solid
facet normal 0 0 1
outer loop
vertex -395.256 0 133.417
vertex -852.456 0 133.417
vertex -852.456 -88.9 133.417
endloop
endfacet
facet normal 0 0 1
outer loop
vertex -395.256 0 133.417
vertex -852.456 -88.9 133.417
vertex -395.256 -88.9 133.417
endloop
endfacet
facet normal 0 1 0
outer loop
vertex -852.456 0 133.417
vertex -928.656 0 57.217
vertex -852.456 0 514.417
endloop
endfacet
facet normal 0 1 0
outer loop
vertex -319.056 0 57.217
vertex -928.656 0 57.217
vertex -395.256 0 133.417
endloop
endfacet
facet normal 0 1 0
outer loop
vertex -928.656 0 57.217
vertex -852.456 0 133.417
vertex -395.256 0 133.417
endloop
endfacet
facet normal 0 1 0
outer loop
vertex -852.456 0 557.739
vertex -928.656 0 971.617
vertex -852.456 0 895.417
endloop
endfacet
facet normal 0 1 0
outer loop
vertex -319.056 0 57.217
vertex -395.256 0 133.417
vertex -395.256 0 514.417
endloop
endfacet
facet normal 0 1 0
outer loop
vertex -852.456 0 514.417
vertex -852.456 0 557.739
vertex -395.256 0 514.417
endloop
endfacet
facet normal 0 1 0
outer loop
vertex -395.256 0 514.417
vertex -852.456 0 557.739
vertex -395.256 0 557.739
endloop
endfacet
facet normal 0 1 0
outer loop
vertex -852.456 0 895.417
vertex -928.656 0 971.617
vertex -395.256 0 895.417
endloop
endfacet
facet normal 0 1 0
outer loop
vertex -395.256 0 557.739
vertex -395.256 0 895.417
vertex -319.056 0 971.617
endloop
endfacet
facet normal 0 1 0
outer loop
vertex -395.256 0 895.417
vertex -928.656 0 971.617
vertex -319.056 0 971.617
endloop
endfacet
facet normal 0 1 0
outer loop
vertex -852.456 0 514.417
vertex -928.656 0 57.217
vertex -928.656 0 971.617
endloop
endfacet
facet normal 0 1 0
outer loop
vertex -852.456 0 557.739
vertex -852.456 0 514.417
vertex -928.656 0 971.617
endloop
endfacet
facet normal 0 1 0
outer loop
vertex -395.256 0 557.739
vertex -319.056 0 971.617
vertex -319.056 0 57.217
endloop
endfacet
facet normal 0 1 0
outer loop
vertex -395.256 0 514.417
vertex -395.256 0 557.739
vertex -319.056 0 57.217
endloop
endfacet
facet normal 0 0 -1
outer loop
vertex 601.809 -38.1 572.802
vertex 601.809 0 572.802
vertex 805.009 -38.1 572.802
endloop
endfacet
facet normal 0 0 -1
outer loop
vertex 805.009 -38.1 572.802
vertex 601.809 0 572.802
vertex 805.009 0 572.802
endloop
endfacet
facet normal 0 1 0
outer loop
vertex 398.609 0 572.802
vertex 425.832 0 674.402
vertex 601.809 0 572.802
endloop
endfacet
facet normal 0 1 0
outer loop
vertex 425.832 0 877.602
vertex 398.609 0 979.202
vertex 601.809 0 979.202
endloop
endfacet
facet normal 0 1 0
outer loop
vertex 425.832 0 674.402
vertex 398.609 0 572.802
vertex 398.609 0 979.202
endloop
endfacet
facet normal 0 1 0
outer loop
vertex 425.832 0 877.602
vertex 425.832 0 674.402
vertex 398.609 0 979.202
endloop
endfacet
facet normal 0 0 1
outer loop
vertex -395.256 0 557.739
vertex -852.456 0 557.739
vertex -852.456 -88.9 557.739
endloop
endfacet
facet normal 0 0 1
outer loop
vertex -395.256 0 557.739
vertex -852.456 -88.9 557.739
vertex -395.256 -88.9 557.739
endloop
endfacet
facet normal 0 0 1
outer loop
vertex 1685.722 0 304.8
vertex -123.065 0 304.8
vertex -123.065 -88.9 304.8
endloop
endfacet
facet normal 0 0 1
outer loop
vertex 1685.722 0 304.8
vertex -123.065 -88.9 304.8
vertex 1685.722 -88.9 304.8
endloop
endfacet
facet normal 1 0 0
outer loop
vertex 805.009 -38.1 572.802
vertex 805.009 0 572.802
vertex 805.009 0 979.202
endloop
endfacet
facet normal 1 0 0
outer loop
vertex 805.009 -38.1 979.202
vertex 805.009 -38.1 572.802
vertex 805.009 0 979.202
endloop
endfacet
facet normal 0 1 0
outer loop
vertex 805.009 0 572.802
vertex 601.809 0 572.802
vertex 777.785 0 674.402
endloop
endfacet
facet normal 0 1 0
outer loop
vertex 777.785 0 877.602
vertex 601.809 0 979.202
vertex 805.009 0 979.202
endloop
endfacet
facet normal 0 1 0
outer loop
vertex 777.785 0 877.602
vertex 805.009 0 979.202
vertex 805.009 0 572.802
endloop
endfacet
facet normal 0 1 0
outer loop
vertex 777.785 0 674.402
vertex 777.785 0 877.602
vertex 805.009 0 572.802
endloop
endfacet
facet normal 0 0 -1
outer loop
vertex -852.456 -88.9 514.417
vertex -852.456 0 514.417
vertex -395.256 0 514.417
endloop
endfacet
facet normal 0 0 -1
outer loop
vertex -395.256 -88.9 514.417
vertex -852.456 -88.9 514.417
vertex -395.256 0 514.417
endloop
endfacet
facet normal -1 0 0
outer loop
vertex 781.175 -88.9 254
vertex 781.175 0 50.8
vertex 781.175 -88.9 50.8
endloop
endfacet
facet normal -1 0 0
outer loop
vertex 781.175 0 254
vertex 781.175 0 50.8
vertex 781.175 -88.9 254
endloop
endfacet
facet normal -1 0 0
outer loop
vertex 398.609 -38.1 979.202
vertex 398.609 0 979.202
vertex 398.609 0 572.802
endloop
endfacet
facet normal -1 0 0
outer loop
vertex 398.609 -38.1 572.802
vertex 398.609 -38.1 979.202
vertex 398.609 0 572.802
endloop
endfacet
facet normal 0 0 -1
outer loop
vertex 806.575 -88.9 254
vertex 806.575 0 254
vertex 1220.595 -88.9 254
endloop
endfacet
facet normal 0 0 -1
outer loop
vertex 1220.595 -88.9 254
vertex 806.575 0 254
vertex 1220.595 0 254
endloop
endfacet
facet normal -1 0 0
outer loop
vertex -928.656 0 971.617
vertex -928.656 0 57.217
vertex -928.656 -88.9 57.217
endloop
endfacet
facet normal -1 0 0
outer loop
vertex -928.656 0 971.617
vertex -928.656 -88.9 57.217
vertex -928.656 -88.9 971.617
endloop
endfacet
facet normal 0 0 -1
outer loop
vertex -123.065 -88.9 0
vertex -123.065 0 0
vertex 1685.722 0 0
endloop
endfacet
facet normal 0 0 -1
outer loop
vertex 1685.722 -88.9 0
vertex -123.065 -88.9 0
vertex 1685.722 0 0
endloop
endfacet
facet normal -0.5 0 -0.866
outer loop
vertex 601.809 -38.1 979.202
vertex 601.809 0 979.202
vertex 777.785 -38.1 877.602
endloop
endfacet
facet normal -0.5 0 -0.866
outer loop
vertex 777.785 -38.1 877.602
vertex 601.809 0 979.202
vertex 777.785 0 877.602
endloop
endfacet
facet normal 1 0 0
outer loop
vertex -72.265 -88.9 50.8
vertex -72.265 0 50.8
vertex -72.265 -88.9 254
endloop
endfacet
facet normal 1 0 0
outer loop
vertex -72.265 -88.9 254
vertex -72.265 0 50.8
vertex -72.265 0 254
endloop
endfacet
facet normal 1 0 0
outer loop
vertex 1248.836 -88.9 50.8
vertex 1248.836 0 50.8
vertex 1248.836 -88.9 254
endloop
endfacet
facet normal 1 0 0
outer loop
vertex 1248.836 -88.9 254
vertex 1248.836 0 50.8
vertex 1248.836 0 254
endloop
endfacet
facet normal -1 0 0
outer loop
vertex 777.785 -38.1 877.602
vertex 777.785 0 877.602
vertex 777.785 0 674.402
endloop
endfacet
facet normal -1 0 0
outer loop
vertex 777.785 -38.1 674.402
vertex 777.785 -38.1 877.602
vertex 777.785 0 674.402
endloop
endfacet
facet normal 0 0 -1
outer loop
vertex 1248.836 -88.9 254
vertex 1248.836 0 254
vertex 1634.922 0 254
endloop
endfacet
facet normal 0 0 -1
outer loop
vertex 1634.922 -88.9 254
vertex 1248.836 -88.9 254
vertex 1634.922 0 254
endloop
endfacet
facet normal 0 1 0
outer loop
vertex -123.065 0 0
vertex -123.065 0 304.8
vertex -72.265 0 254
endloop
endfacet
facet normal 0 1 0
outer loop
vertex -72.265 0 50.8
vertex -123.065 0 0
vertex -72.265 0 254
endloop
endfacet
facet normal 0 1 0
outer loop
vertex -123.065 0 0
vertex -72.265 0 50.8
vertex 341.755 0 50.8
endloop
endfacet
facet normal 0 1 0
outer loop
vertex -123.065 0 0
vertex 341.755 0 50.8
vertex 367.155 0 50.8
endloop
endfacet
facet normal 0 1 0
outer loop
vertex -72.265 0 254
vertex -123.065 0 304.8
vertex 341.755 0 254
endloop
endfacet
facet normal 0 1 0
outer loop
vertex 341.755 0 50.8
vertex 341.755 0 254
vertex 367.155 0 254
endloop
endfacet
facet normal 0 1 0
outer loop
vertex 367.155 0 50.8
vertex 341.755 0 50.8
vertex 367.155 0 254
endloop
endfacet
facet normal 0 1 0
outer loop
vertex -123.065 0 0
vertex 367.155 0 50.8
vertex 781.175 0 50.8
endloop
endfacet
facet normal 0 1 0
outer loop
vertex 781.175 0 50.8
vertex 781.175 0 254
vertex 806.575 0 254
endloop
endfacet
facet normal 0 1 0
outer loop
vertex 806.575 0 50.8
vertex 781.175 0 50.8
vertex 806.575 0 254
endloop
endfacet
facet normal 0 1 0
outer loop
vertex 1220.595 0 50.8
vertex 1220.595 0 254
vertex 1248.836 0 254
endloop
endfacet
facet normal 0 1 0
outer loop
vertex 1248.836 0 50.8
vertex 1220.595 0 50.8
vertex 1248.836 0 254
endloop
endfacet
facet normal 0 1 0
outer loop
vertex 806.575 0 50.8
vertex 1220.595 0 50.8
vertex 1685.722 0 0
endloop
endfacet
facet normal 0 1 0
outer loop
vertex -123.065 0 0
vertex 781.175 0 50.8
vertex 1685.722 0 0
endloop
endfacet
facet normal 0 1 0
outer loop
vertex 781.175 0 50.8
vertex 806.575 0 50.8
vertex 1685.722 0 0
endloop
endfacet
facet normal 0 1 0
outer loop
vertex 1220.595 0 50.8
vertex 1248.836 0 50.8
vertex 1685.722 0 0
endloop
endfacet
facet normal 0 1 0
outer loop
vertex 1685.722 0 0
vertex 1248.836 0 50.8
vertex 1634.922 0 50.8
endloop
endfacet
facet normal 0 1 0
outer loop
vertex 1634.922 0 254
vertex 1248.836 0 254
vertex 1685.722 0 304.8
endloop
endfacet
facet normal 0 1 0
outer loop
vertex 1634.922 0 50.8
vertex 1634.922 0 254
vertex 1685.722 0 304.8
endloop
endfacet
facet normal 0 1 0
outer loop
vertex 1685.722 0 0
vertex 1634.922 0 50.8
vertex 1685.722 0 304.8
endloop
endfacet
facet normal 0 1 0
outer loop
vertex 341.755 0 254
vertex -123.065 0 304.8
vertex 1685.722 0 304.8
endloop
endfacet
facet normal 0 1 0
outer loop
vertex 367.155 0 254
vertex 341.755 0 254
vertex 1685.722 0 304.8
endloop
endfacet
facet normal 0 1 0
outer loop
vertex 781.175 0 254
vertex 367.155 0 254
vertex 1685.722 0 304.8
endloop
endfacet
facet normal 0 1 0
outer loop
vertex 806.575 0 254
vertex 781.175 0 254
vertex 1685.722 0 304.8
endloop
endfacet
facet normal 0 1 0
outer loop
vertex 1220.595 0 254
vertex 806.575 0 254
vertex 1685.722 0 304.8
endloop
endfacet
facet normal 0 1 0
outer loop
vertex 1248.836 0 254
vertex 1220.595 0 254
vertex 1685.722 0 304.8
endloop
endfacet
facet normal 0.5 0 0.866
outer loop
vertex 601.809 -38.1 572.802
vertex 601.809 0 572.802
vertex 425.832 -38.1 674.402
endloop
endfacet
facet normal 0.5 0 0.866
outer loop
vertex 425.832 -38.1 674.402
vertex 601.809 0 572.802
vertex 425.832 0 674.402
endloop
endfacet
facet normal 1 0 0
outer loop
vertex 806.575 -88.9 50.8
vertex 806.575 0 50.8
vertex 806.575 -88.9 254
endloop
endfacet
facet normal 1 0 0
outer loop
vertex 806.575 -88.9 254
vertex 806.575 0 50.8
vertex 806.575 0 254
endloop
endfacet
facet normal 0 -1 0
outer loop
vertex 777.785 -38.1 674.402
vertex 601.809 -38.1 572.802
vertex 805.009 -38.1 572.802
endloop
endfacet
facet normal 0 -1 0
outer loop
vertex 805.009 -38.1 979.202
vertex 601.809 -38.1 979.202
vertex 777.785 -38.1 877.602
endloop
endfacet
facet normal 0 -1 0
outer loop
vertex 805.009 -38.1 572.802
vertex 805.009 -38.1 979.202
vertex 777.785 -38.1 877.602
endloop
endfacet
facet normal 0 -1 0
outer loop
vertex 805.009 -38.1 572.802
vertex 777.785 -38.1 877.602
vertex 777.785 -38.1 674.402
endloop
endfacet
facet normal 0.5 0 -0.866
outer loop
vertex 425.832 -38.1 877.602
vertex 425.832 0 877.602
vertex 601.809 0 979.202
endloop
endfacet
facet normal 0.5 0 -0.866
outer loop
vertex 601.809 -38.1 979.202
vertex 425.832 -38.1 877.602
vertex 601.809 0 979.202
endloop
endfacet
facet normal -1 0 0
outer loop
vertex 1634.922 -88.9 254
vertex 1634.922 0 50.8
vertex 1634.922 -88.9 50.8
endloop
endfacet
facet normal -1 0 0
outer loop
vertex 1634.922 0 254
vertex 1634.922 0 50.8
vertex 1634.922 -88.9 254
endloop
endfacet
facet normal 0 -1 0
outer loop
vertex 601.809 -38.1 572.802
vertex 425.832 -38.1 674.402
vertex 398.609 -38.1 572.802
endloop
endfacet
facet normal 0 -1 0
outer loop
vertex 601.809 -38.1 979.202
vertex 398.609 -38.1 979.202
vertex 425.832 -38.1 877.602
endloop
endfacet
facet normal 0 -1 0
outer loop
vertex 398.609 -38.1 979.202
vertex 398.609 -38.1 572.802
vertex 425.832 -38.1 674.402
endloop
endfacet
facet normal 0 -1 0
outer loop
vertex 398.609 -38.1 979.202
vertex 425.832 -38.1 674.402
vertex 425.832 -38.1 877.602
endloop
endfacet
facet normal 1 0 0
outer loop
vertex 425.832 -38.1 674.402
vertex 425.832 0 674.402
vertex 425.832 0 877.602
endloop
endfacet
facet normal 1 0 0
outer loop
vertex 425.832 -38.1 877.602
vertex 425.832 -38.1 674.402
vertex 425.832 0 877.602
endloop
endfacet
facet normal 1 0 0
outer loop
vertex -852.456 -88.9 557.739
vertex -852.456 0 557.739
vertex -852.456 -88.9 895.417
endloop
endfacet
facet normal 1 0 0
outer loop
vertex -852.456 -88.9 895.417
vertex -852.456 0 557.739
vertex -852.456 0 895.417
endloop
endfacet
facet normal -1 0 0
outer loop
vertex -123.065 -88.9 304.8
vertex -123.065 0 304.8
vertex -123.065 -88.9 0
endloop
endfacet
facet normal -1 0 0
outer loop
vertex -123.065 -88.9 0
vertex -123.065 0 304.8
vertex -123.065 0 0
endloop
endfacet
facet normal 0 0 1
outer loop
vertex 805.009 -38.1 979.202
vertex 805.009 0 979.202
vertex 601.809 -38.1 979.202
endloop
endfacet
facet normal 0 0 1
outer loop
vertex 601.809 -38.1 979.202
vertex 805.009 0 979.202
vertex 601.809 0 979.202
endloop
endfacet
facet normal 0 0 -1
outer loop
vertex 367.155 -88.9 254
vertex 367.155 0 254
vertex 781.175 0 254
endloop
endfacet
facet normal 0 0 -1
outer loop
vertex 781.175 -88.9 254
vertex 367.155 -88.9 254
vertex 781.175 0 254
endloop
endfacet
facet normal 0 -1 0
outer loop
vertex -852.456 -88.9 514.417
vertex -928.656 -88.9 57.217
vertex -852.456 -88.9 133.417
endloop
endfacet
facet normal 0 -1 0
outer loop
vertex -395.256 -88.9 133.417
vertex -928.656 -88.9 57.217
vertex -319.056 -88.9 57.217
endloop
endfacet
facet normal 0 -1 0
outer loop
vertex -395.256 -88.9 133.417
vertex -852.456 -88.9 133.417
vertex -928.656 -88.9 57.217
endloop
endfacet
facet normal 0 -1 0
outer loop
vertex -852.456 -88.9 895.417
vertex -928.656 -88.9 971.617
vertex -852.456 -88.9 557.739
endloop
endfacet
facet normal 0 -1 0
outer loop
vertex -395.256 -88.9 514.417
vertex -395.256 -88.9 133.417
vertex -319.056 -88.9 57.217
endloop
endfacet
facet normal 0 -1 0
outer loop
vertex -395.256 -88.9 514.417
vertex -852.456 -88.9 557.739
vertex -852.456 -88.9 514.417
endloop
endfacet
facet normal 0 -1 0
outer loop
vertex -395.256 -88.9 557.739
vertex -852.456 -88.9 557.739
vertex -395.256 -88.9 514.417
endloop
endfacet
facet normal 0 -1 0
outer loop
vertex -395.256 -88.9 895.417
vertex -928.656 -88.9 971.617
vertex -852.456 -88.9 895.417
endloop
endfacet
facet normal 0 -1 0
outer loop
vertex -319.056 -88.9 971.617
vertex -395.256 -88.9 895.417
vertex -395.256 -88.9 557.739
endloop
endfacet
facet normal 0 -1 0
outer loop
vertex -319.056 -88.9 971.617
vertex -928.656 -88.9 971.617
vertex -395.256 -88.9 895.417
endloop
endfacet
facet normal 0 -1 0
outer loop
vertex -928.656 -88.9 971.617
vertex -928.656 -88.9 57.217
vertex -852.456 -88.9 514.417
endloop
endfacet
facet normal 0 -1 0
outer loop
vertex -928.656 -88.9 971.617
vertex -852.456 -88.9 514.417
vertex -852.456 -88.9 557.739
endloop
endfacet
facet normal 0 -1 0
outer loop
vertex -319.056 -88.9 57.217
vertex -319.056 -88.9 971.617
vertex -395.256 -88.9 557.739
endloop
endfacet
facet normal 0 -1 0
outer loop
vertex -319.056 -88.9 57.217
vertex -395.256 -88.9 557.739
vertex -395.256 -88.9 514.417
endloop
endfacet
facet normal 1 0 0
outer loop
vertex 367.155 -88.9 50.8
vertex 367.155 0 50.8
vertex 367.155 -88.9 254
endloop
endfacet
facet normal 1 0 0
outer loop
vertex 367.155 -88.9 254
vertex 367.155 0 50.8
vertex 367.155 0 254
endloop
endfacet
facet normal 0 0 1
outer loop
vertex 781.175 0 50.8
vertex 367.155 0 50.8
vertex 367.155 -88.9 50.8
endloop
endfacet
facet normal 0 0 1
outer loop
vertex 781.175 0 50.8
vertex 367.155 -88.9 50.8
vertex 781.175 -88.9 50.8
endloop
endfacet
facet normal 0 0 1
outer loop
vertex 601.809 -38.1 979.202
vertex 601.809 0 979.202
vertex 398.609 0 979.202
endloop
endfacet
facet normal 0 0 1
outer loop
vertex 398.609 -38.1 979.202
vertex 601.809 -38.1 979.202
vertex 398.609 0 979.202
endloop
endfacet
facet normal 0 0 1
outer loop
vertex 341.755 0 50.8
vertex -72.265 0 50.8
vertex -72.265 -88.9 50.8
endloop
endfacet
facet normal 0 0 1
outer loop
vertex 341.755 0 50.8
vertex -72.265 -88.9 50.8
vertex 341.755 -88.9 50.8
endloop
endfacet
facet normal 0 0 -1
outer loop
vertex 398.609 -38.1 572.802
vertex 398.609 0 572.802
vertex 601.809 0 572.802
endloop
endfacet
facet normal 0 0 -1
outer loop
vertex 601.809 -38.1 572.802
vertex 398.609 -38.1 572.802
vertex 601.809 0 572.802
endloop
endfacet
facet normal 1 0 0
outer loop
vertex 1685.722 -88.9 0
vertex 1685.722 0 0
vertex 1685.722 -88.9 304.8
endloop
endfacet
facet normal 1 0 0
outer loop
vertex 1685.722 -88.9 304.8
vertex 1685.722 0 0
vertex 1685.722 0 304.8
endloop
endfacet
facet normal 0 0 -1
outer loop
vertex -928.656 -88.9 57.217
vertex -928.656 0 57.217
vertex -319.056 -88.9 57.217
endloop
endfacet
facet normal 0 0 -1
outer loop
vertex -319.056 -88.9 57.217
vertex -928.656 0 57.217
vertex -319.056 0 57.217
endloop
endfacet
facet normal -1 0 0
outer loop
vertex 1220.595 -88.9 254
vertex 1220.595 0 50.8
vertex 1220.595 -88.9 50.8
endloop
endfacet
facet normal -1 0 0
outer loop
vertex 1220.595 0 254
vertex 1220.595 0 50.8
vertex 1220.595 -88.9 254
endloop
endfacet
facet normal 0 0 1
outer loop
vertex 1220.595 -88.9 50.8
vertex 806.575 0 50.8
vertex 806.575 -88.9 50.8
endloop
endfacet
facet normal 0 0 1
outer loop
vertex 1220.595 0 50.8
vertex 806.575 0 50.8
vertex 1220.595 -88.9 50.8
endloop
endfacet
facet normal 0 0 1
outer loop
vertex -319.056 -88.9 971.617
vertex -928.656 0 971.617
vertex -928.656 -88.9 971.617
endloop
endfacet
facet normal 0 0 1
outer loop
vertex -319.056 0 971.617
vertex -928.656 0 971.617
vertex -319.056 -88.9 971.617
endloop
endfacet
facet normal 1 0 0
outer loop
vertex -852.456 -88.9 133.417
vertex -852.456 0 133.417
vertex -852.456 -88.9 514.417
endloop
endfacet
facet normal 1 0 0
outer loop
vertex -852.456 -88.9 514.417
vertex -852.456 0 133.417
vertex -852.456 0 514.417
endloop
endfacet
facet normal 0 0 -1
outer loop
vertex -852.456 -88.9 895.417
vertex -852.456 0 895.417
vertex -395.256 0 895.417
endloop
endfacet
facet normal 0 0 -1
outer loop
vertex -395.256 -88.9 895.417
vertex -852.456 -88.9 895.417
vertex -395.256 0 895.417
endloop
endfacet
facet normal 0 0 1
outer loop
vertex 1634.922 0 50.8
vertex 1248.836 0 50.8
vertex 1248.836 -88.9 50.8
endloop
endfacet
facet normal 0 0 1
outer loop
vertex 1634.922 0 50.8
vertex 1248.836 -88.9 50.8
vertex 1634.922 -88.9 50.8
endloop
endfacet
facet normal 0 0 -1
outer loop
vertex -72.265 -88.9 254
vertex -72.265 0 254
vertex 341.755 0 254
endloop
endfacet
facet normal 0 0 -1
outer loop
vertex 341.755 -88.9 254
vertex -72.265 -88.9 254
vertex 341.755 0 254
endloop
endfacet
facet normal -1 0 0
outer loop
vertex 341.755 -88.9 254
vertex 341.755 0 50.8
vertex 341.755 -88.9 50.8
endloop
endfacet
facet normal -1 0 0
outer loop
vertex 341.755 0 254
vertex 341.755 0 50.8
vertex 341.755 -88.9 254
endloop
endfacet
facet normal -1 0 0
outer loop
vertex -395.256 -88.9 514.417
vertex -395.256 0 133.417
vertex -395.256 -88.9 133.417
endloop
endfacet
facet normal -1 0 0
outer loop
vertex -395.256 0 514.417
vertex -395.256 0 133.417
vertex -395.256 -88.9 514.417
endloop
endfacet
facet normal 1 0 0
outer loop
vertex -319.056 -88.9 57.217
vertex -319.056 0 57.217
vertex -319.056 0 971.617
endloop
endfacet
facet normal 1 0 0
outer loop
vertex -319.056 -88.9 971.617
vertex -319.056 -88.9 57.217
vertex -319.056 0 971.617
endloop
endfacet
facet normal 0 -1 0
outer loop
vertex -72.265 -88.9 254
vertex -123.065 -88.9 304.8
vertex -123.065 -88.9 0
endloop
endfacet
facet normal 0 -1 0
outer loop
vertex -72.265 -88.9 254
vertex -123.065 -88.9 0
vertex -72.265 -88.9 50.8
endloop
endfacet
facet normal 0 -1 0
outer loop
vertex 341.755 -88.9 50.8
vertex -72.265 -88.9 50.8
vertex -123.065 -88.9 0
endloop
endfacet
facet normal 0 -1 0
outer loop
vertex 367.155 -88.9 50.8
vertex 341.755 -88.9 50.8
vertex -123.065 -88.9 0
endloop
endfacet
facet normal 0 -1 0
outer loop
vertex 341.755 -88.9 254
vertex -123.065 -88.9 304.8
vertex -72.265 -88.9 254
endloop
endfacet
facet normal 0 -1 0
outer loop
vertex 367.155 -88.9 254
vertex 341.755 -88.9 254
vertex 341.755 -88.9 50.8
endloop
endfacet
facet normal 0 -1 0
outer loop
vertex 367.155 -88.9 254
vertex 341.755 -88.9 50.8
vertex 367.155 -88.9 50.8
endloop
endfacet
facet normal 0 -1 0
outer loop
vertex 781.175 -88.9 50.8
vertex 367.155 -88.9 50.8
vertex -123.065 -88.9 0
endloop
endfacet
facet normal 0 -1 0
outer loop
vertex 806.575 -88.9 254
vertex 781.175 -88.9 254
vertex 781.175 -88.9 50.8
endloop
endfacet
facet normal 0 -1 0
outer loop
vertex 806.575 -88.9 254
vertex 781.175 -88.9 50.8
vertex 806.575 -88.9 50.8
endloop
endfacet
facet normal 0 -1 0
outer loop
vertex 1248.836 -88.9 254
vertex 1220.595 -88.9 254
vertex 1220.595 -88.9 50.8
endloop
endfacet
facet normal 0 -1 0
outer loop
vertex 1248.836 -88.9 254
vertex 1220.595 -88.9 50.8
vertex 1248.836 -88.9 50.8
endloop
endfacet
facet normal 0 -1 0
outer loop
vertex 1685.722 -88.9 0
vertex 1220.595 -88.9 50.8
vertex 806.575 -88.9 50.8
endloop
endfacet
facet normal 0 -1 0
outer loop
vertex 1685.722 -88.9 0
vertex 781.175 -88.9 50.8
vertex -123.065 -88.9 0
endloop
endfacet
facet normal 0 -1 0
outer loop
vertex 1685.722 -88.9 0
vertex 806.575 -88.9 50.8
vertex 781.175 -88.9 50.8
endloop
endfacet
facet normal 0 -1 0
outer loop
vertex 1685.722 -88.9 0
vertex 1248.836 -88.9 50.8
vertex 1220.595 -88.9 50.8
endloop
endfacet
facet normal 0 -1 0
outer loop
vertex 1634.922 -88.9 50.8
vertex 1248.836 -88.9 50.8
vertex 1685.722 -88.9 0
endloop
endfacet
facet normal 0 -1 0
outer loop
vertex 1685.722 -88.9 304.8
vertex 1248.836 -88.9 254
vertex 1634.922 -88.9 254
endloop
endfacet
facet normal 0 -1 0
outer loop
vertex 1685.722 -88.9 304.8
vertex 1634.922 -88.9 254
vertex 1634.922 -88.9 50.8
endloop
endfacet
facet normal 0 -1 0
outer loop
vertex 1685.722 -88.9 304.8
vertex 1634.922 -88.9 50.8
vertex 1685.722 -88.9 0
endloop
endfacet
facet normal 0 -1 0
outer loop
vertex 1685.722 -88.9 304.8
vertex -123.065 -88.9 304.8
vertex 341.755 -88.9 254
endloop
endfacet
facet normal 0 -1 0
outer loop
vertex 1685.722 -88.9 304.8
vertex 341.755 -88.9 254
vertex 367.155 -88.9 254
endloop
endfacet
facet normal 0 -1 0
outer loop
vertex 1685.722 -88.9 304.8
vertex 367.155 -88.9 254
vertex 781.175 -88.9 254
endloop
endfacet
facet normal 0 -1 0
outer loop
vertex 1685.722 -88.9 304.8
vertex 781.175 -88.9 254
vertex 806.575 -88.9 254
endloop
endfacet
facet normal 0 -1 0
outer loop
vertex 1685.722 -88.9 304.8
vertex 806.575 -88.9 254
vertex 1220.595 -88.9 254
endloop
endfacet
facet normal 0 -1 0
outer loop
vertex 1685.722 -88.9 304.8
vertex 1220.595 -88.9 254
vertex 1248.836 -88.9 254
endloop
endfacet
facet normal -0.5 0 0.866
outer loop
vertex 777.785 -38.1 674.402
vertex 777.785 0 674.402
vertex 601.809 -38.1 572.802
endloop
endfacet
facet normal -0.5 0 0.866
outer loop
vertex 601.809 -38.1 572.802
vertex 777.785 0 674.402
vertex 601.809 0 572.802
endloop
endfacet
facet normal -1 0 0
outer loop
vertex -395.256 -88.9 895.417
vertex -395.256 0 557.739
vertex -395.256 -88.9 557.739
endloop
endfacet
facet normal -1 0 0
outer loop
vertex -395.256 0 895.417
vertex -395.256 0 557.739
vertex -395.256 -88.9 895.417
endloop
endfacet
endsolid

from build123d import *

# Parameters (mm, degrees)
F0_W     = 1808.7867725551
F0_H     = 0.358789257
F0_H_2   = 304.441210743
F0_W_2   = 414.02
F0_H_3   = 203.2
F0_W_3   = 386.0863779962
F1_DEPTH = 88.9
F2_W     = 609.6
F2_H     = 914.4
F2_W_2   = 457.2
F2_H_2   = 381
F2_H_3   = 337.6778893888
F3_DEPTH = 88.9
F5_DEPTH = 38.1


with BuildPart() as f1:
    # F0 (on Front) → F1 (new body)
    with BuildSketch(Plane.XZ):
        with Locations((781.3286745876, 0.1793946285)):
            Rectangle(F0_W, F0_H)
        with Locations((781.3286745876, 152.5793946285)):
            Rectangle(F0_W, F0_H_2)
        with Locations((134.7452883101, 152.4)):
            Rectangle(F0_W_2, F0_H_3, mode=Mode.SUBTRACT)
        with Locations((574.1652883101, 152.4)):
            Rectangle(F0_W_2, F0_H_3, mode=Mode.SUBTRACT)
        with Locations((1013.5852883101, 152.4)):
            Rectangle(F0_W_2, F0_H_3, mode=Mode.SUBTRACT)
        with Locations((1441.8788718671, 152.4)):
            Rectangle(F0_W_3, F0_H_3, mode=Mode.SUBTRACT)
    extrude(amount=F1_DEPTH)


with BuildPart() as f3:
    # F2 (on Front) → F3 (new body)
    with BuildSketch(Plane.XZ):
        with Locations((-623.8560936928, 514.4173856199)):
            Rectangle(F2_W, F2_H)
        with Locations((-623.8560936928, 323.9173856199)):
            Rectangle(F2_W_2, F2_H_2, mode=Mode.SUBTRACT)
        with Locations((-623.8560936928, 726.5784409255)):
            Rectangle(F2_W_2, F2_H_3, mode=Mode.SUBTRACT)
    extrude(amount=F3_DEPTH)


with BuildPart() as f5:
    # F4 (on Front) → F5 (new body)
    with BuildSketch(Plane.XZ):
        Polygon((805.008807373, 979.201887989), (601.808807373, 979.201887989), (777.785169422, 877.601887989), (777.785169422, 674.401887989), (601.808807373, 572.801887989), (805.008807373, 572.801887989), align=None)
    extrude(amount=F5_DEPTH)


with BuildPart() as f5b:
    # F4 (on Front) → F5, piece 2 (new body)
    with BuildSketch(Plane.XZ):
        Polygon((601.808807373, 979.201887989), (398.608807373, 979.201887989), (398.608807373, 572.801887989), (601.808807373, 572.801887989), (425.832445324, 674.401887989), (425.832445324, 877.601887989), align=None)
    extrude(amount=F5_DEPTH)


solid = Compound([f1.part, f3.part, f5.part, f5b.part])
